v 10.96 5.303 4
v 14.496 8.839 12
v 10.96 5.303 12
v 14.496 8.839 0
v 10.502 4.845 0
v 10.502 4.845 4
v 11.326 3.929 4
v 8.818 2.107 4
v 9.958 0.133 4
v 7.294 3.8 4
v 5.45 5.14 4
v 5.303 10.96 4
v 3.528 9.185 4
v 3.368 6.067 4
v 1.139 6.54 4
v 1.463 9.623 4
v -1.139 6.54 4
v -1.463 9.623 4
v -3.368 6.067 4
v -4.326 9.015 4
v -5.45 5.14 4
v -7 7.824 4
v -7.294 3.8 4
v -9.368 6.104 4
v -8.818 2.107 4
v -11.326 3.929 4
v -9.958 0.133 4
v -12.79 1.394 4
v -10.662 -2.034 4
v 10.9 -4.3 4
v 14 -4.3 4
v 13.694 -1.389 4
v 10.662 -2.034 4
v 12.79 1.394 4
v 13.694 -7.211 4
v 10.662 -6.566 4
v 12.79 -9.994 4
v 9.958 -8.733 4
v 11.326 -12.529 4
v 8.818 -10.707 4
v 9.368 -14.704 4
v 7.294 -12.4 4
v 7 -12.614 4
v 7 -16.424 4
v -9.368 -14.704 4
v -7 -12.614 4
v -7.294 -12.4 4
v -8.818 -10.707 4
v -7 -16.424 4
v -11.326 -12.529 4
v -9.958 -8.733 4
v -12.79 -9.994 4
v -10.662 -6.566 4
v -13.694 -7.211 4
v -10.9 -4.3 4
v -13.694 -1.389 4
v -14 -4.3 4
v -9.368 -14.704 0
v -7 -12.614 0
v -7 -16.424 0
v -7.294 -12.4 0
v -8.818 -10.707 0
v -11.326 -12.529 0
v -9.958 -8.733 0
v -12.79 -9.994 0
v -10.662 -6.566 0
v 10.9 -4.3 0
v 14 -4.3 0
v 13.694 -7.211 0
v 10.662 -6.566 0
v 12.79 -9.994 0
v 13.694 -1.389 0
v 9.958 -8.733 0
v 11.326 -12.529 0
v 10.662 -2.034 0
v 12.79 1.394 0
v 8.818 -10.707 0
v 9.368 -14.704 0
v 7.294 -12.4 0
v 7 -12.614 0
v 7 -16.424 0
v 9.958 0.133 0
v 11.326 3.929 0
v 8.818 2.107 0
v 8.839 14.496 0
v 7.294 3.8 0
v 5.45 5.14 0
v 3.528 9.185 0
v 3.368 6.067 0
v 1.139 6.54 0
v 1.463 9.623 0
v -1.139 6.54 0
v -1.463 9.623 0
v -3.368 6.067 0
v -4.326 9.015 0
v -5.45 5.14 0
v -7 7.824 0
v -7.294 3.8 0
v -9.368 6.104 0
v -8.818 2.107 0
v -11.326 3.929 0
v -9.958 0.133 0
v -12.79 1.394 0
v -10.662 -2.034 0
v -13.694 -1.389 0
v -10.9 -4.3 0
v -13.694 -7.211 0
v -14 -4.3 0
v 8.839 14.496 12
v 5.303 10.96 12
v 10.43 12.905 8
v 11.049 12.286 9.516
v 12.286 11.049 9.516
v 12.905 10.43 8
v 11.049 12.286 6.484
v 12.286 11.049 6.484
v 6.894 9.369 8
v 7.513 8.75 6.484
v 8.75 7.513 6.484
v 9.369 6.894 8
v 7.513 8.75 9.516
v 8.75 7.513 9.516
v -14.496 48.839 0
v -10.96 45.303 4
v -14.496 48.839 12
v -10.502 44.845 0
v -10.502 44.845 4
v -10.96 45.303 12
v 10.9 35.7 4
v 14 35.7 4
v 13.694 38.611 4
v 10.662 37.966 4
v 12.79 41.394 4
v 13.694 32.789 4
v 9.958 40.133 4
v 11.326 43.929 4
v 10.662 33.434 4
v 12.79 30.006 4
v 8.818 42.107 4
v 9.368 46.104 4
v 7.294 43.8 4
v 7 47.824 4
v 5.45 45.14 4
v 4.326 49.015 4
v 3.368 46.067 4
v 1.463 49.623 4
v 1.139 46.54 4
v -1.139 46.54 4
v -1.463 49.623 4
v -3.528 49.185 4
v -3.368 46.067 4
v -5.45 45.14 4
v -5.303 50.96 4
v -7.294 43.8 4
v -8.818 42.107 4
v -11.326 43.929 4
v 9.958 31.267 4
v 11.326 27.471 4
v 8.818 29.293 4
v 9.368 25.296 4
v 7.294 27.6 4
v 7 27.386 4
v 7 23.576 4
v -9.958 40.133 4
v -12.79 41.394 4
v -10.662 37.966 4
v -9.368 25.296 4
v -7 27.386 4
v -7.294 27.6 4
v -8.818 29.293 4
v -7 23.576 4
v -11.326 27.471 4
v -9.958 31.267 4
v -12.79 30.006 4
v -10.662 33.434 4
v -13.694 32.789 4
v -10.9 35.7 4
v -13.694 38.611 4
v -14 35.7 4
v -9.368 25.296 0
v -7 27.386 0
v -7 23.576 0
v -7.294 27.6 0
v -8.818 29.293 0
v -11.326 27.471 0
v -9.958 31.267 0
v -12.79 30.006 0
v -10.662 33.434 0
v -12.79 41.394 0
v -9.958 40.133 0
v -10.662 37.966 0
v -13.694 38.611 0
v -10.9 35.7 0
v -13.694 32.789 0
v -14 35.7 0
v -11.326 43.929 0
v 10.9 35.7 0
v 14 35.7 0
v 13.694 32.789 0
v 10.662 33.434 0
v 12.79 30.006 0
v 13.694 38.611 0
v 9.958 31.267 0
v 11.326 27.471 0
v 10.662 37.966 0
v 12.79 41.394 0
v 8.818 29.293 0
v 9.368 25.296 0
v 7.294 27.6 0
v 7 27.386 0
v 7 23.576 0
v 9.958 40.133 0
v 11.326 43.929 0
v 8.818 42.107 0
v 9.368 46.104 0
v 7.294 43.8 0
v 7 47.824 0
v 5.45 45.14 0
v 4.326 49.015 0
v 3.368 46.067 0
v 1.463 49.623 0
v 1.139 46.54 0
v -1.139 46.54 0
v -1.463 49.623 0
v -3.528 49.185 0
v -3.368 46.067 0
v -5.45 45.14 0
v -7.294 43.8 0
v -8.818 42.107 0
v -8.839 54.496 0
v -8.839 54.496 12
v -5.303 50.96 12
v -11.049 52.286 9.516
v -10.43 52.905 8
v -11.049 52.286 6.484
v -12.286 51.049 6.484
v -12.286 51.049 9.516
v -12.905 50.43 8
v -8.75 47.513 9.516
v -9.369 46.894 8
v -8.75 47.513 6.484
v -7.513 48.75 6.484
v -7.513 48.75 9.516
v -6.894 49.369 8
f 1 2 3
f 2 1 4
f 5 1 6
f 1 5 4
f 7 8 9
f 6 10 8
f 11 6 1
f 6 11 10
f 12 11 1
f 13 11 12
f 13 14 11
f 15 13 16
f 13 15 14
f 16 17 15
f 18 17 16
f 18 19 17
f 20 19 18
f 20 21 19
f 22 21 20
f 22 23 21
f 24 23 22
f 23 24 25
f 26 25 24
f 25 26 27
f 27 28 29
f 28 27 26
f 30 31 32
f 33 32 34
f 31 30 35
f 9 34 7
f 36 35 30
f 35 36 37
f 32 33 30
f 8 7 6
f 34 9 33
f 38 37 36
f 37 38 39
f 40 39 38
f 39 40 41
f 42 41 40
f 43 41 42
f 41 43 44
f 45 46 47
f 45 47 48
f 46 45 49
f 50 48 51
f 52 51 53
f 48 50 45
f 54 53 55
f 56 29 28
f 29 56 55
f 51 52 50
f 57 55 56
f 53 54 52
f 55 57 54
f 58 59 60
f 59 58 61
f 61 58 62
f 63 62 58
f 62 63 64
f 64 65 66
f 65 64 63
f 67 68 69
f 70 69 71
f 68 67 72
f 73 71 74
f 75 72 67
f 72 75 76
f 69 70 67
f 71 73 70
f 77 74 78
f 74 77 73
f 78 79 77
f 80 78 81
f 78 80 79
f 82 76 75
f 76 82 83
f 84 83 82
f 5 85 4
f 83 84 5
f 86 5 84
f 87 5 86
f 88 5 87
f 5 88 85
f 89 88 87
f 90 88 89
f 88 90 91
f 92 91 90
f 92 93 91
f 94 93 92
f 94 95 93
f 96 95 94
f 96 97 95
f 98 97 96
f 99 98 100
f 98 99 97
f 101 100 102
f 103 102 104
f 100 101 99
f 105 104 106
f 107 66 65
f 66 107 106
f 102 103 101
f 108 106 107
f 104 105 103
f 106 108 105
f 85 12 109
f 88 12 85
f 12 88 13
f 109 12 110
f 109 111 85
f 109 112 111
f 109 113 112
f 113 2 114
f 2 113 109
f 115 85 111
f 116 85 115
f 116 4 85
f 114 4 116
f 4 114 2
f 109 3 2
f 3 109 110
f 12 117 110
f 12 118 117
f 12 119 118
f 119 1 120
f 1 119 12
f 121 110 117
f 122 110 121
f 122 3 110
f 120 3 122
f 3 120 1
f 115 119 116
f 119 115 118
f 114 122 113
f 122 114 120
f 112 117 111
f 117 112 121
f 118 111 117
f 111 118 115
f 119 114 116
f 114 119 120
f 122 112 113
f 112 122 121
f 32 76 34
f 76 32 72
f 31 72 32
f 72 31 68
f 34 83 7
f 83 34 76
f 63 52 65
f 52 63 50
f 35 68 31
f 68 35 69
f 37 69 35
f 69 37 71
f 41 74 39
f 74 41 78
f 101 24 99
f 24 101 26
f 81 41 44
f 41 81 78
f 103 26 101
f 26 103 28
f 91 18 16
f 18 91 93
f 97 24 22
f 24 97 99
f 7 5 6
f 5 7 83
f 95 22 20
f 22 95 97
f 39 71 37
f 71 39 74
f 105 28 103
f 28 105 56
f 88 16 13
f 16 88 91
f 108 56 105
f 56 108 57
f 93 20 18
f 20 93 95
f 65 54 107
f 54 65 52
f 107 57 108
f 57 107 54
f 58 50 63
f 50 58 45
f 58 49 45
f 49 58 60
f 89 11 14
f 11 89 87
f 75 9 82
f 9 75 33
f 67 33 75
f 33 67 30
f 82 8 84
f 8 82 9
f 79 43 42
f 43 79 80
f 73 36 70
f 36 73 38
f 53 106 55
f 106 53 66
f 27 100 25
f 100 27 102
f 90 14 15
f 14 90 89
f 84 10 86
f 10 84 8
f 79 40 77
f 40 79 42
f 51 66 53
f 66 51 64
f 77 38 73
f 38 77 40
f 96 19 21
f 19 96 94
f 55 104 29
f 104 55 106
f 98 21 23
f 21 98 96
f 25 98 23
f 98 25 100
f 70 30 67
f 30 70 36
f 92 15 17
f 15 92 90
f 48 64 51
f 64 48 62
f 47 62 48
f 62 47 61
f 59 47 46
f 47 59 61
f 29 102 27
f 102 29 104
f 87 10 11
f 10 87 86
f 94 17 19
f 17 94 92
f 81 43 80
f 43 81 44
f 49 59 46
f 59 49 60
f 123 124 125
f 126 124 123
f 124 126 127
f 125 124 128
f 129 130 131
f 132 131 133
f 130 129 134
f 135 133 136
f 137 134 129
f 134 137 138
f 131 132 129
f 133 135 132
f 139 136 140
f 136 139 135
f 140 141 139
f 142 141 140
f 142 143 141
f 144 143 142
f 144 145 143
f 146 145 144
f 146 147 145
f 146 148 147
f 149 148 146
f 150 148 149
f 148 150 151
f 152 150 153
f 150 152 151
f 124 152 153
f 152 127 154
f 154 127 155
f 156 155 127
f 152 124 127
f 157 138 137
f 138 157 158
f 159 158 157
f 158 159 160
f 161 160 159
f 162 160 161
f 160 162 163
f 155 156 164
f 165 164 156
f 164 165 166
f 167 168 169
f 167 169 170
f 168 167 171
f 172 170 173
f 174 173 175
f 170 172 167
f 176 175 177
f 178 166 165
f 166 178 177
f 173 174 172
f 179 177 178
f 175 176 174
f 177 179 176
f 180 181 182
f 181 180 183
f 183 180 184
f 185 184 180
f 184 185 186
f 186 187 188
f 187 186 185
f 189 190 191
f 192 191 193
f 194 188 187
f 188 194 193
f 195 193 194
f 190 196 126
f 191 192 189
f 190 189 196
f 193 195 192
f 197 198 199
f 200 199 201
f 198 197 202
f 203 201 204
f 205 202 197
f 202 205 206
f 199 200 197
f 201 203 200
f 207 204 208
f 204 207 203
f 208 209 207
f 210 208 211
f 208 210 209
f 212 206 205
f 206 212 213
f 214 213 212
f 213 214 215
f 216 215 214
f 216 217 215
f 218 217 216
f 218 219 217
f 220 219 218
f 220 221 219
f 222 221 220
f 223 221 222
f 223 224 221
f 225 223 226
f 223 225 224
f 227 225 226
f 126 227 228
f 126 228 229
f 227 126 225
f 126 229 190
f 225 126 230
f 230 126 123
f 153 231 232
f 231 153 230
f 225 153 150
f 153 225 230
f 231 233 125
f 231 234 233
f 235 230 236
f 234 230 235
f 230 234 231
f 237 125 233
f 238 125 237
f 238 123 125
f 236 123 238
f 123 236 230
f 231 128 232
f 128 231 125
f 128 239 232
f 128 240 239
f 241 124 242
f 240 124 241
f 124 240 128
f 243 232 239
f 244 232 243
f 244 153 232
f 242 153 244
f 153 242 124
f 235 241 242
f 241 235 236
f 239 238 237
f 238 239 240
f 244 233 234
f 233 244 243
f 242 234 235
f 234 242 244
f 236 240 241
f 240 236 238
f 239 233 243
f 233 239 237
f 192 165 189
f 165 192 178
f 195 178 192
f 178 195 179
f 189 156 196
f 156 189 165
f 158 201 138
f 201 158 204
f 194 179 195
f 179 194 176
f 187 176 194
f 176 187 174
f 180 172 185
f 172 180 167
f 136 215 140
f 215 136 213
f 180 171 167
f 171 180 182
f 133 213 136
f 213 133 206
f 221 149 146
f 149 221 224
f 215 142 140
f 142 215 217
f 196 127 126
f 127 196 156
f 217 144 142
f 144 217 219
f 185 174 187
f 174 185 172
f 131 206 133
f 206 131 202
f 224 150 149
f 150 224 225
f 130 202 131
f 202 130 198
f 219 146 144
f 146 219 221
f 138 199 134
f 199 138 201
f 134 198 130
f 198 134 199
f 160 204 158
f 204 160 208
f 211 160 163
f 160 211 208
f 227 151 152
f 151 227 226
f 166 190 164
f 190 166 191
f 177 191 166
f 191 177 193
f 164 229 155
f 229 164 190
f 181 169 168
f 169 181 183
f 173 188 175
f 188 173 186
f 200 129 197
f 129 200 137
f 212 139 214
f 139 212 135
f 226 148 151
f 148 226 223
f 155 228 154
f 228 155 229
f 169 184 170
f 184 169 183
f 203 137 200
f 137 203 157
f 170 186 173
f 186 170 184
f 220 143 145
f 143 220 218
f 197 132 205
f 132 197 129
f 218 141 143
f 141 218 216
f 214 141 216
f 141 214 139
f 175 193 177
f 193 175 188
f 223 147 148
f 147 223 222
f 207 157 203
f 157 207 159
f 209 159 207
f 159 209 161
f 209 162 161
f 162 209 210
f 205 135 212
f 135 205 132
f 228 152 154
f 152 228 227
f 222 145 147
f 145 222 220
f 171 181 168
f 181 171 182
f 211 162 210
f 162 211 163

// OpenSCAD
// Set your fan angle as desired
fan_angle = 45; // [0:90]

fan_clip();

translate([0,40,0])
mirror([1,0,0])
fan_clip();

module fan_clip()
{
	rotate([0,0,-fan_angle])
	difference()
	{
		union()
		{
			translate([-4,8.5,0])
			cube([8,8,4]);

			translate([-4,11.5,0])
			cube([8,5,12]);
		}

		translate([0,20,8])
		rotate([90,0,0])
		cylinder(r=3.5/2, h=15);
	}

	difference(){
		translate([0,-4.3,0])
		cylinder(r=14, h=4);

		translate([0,-4.3,-1])
		cylinder(r=10.9, h=6);

		translate([-7,-20,-1])
		cube([14,10,6]);
	}
}
